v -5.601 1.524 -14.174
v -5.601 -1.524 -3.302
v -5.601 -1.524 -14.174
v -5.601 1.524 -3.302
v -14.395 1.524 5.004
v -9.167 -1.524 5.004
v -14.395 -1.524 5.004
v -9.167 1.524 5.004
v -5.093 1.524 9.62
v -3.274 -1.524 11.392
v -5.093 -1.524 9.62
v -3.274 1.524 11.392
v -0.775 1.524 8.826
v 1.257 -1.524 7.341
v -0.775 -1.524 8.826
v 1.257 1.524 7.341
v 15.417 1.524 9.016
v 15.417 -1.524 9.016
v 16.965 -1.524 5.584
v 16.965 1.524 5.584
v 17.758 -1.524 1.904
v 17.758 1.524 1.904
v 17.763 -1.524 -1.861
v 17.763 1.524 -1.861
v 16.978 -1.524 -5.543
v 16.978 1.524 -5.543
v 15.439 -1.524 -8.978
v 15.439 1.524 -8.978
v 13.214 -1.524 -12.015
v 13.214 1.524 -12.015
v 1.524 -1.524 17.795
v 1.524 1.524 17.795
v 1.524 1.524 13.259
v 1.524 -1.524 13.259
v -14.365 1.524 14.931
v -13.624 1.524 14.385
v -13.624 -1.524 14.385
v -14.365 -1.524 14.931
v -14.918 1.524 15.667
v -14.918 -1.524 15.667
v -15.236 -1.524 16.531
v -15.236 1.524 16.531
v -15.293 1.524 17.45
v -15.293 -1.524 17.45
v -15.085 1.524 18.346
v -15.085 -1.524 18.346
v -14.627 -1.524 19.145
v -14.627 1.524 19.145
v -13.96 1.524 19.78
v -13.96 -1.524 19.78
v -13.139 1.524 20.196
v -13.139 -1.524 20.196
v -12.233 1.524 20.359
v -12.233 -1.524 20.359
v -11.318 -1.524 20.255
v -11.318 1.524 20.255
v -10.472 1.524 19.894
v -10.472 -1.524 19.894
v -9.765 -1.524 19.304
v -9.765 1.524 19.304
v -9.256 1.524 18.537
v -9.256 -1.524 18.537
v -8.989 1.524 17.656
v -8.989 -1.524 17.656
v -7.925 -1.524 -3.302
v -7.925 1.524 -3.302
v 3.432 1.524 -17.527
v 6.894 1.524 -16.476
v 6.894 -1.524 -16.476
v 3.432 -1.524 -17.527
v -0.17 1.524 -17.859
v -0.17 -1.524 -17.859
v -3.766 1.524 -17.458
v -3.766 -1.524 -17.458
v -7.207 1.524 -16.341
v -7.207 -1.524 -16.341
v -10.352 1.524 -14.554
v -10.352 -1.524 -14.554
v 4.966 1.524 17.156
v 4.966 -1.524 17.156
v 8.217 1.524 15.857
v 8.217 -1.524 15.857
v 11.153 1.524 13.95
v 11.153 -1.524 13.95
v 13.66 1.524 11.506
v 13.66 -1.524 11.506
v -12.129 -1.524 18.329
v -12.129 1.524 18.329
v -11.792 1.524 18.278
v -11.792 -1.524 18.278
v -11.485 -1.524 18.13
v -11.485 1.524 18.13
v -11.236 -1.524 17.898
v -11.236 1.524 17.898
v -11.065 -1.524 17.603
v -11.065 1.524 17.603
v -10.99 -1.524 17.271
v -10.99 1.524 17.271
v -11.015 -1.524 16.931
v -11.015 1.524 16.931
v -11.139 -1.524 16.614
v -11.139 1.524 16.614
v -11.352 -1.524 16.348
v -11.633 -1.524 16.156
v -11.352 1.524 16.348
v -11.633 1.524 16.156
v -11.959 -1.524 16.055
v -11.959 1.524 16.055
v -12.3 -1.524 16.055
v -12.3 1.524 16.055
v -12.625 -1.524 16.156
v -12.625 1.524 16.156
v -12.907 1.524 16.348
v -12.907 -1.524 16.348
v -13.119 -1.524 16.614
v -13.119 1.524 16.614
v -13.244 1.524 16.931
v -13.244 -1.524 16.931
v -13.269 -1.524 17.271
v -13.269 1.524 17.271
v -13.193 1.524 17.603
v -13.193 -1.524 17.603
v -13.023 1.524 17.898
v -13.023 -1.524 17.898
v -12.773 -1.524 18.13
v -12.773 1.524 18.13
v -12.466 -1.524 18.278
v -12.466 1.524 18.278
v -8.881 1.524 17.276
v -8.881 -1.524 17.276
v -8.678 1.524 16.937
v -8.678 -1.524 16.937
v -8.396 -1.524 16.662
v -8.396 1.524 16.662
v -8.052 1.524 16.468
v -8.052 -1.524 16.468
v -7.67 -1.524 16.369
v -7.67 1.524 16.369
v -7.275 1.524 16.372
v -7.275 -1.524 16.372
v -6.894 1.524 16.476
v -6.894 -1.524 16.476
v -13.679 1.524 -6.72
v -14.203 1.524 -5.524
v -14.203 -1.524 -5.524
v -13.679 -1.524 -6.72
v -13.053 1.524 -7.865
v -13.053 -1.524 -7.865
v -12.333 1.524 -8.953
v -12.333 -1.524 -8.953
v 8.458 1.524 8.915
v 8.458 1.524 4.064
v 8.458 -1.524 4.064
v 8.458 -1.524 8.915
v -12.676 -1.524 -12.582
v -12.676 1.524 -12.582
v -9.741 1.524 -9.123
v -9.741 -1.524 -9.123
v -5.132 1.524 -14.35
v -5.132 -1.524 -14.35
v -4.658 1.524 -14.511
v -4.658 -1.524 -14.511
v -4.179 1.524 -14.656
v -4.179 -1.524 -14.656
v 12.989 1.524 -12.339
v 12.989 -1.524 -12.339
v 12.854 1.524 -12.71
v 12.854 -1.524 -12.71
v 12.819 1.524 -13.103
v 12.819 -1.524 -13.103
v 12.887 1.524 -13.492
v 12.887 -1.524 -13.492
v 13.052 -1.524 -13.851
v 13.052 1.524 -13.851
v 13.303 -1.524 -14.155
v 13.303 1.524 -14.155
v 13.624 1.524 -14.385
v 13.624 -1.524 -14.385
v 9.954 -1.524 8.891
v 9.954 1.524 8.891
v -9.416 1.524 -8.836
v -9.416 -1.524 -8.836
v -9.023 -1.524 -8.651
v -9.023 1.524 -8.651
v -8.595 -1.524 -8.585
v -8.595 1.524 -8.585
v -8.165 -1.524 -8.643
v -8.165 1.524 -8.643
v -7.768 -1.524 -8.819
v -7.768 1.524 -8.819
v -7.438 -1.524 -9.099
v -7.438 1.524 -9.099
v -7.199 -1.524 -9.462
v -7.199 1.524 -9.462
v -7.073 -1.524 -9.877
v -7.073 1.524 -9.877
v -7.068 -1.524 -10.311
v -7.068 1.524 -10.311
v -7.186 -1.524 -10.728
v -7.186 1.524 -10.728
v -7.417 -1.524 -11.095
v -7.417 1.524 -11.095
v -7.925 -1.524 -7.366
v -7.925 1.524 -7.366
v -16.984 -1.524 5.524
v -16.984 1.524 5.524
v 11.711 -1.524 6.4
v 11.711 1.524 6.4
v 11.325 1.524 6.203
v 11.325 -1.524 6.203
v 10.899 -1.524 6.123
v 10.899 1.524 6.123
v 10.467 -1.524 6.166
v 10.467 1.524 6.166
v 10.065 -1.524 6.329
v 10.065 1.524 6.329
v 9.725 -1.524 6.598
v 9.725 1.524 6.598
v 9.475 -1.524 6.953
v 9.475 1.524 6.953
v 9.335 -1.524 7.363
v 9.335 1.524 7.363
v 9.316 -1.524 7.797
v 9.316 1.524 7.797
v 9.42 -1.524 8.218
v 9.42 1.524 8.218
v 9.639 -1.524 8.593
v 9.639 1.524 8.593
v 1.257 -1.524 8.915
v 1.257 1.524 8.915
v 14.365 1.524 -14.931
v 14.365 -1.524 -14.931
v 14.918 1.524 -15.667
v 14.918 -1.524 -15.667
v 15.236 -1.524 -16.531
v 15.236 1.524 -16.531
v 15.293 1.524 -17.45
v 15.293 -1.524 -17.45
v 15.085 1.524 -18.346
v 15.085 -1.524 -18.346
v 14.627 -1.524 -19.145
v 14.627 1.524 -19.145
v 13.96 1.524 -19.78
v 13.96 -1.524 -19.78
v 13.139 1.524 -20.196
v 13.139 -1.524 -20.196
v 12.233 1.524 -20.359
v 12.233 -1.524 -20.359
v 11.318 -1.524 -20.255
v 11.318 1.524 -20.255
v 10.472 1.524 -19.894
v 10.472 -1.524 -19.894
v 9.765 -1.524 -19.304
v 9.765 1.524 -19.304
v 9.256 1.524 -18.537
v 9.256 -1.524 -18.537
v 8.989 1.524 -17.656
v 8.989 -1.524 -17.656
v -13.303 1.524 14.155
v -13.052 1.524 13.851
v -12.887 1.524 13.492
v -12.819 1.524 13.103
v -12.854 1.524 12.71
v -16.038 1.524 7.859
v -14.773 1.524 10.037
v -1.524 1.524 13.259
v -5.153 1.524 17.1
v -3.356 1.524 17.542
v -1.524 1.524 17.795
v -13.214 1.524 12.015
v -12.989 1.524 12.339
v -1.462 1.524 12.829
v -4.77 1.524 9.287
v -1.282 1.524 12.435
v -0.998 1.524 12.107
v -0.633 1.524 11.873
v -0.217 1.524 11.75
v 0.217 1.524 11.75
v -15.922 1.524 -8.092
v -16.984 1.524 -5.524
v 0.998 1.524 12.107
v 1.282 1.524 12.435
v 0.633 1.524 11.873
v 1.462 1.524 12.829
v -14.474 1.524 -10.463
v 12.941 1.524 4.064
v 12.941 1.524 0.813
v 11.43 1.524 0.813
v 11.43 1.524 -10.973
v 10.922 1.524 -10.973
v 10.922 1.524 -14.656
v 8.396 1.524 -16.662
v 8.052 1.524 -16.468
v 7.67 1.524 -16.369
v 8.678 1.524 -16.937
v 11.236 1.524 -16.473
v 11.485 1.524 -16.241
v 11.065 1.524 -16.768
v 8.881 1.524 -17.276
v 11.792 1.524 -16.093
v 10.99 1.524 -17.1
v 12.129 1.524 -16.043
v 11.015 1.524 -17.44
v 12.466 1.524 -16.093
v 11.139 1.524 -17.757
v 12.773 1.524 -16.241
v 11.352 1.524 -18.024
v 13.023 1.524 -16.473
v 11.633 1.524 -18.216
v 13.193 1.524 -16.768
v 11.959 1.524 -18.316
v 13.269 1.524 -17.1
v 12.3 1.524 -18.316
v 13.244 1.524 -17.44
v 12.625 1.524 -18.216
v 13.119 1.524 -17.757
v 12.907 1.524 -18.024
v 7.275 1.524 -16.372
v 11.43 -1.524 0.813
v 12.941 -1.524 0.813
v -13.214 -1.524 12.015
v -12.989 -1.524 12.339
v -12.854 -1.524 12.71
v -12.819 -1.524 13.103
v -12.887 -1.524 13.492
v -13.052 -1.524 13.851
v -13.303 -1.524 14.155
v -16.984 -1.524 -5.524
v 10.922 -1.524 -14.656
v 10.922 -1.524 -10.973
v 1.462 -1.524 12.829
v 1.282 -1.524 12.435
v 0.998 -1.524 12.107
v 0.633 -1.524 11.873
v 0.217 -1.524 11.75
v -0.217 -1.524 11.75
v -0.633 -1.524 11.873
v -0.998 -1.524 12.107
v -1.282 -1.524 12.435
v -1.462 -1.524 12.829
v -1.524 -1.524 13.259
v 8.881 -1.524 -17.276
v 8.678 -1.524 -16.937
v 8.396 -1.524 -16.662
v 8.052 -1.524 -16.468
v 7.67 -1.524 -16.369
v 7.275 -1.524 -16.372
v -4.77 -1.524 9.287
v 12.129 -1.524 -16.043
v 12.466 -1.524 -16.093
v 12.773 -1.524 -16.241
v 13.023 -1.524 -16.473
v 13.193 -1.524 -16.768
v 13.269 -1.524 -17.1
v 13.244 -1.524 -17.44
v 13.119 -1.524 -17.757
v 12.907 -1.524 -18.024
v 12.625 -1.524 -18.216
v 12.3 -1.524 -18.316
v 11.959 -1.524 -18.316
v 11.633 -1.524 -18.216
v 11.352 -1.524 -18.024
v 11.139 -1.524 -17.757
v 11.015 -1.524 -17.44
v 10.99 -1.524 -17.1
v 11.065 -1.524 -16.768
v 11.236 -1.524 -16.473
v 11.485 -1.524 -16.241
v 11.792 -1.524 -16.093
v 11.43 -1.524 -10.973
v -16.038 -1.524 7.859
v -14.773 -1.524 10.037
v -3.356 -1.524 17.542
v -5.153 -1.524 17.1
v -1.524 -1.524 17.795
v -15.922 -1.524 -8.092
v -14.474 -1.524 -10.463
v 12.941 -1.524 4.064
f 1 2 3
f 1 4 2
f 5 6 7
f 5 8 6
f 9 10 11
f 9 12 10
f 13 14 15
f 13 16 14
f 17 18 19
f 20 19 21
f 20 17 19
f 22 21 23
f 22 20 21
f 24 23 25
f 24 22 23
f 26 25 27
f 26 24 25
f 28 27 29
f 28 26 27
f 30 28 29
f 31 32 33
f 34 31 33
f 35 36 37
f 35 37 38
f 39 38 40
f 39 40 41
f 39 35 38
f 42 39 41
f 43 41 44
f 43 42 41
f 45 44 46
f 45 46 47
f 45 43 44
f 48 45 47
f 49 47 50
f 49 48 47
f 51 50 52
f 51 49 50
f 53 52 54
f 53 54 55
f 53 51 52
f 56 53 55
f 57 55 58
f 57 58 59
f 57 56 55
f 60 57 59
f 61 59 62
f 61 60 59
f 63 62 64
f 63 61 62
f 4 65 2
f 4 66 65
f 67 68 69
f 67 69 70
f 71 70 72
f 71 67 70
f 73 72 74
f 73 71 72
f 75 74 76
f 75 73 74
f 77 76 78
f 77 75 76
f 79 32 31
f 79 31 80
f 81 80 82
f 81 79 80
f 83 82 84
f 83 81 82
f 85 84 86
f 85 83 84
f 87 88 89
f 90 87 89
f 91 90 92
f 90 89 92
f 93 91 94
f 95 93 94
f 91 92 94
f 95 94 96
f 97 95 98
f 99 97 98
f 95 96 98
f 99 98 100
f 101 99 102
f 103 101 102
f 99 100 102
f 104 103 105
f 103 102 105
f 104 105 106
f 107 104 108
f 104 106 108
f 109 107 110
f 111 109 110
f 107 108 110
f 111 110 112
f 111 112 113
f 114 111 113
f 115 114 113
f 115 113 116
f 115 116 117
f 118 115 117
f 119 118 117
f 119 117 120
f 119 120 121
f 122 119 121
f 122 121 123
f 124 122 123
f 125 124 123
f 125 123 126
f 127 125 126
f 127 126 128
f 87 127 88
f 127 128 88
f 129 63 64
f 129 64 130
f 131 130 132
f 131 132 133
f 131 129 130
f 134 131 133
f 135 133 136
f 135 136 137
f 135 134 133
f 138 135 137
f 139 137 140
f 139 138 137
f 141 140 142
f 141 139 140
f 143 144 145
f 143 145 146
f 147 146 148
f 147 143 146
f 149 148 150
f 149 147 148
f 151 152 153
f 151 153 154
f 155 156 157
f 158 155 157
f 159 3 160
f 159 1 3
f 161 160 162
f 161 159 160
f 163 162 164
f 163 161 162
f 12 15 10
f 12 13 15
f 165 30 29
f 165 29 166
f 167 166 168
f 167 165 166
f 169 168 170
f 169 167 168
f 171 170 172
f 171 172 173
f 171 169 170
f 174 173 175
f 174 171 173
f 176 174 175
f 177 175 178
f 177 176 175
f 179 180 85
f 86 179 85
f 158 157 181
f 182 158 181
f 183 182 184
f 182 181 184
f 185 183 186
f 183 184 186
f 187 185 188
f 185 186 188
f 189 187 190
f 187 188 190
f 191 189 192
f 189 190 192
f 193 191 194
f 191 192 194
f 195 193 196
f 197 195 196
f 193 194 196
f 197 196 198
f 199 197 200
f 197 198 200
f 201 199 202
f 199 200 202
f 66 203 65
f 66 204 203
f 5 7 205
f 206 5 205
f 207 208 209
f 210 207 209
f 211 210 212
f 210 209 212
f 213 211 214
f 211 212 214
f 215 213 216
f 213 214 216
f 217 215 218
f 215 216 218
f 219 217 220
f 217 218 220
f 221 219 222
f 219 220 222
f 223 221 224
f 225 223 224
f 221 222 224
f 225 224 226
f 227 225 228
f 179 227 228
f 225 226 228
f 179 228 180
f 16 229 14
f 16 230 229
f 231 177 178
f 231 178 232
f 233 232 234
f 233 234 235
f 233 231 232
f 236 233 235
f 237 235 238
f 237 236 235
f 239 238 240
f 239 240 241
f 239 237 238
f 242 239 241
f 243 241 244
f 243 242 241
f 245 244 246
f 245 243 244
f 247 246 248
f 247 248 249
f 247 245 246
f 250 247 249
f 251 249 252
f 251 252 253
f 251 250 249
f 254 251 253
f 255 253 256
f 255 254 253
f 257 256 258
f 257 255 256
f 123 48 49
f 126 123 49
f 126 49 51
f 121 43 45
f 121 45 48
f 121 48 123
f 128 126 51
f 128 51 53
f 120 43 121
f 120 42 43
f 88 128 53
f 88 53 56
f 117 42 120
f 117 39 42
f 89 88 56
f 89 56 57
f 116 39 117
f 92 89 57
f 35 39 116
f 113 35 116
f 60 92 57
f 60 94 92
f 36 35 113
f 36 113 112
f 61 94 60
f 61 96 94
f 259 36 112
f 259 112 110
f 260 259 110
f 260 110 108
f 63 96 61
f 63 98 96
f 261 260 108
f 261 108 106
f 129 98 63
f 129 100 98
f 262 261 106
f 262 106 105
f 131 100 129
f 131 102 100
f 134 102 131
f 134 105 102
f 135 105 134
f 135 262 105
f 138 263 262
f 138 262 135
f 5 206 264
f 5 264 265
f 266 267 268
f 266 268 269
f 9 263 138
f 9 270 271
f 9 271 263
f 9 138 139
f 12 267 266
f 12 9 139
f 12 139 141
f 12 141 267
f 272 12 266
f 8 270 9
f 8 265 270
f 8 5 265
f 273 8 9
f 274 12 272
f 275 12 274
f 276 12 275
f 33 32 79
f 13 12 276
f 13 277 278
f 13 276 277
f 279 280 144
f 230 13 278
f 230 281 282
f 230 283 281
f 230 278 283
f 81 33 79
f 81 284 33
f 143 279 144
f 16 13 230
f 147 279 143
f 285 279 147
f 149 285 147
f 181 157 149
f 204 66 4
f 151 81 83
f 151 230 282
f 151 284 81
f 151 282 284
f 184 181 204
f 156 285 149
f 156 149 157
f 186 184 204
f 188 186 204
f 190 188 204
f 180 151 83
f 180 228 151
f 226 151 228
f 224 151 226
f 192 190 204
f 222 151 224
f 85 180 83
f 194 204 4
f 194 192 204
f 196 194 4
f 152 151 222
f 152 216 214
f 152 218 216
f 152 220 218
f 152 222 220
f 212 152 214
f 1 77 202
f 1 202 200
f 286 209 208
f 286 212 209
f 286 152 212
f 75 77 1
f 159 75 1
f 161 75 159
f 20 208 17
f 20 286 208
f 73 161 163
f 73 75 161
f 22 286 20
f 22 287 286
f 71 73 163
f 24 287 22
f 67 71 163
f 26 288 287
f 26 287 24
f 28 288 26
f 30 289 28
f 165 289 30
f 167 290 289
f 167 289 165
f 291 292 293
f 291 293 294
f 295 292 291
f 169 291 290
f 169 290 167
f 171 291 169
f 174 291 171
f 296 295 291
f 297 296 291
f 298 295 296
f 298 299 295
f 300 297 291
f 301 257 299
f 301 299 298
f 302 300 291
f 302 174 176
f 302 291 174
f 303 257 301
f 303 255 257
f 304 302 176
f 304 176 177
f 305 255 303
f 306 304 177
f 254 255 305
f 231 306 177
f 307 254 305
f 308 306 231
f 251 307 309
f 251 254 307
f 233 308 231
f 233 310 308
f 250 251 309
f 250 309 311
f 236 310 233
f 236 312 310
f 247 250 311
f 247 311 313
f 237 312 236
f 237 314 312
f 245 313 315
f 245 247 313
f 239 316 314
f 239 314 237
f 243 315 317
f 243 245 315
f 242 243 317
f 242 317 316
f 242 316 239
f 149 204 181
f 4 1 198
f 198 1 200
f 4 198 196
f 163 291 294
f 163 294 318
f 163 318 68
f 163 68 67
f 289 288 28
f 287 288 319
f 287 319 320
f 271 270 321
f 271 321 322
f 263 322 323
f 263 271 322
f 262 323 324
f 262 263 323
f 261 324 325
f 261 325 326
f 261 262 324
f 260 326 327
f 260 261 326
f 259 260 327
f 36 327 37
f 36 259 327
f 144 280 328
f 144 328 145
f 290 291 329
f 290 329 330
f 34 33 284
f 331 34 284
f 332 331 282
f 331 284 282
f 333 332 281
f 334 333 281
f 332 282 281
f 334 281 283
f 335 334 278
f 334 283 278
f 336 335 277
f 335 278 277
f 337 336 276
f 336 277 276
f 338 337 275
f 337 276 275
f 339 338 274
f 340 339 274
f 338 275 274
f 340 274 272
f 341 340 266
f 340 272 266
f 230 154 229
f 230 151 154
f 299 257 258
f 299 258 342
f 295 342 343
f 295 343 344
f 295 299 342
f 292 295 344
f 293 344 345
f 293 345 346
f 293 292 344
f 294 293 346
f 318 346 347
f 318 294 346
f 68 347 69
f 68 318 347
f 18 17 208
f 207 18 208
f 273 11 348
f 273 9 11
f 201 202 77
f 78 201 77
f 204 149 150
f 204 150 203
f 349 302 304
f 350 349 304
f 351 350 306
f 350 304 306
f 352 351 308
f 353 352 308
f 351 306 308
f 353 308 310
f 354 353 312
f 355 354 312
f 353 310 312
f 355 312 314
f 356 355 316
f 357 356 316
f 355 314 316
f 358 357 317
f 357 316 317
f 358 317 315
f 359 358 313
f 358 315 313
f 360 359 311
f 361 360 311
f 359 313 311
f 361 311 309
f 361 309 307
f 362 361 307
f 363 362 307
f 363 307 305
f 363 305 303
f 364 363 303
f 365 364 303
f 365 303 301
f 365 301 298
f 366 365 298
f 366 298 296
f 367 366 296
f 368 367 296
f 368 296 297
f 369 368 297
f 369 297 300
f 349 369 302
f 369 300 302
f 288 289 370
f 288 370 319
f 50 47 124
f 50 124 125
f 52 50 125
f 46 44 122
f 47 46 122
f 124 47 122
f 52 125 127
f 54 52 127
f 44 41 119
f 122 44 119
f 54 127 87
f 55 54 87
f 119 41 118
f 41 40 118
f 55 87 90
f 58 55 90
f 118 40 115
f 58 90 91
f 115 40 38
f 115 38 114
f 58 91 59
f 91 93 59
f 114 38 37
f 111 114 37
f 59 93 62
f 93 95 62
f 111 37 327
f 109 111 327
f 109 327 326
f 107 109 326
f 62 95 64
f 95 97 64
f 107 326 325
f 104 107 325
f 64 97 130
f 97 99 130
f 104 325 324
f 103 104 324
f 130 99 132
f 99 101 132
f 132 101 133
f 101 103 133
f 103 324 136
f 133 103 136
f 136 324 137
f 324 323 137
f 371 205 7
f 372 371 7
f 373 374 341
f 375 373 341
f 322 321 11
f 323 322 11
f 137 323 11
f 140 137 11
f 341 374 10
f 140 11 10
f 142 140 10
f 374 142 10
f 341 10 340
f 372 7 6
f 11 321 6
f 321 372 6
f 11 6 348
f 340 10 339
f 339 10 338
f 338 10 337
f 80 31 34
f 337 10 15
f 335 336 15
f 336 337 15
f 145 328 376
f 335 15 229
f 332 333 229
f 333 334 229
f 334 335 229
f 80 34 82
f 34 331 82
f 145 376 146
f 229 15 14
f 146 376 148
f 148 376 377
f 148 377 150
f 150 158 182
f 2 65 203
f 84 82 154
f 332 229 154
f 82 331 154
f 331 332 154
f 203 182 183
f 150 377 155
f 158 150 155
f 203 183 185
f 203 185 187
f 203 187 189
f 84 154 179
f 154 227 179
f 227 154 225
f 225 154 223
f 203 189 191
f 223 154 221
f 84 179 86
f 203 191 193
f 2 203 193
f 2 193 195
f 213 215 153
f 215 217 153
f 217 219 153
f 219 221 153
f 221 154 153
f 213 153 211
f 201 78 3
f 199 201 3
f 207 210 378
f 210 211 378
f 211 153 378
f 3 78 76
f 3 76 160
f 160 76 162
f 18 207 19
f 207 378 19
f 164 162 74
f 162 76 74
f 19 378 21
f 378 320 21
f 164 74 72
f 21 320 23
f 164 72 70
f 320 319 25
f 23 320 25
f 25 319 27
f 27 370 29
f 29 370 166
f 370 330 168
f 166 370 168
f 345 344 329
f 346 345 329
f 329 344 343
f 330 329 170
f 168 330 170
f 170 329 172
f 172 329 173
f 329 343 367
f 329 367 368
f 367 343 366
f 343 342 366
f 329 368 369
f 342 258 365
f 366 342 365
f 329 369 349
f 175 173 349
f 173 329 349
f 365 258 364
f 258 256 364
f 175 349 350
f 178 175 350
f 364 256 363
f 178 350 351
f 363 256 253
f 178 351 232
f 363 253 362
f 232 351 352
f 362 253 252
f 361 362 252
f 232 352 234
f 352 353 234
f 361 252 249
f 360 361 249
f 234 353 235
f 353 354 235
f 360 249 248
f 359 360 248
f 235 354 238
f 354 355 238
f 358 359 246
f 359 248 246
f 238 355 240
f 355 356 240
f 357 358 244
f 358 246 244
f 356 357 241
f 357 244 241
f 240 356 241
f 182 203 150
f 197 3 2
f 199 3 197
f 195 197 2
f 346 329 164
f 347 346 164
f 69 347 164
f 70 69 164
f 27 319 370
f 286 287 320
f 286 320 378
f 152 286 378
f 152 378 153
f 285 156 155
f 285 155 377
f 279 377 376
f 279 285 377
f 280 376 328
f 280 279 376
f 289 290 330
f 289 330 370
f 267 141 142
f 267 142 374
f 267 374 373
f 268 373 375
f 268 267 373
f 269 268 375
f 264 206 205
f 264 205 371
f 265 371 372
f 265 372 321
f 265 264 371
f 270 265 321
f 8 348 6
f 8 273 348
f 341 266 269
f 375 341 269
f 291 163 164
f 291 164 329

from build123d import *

# Parameters (mm, degrees)
SKETCH1_R             = 1.143
BOSS_EXTRUDE1_DEPTH   = 1.524
BOSS_EXTRUDE1_2_DEPTH = 1.524
SKETCH2_R             = 1.143
CUT_EXTRUDE2_DEPTH    = 26.441049651
SKETCH3_R             = 1.143
BOSS_EXTRUDE2_DEPTH   = 3.048


with BuildPart() as part:
    # Sketch1 → Boss-Extrude1 (new, symmetric)
    with BuildSketch(Plane(origin=(0, 0, 0), x_dir=(1, 0, 0), z_dir=(0, 1, 0))):
        with BuildLine():
            Line((-14.395123673, -5.0038), (-16.984058744, -5.5245))
            ThreePointArc((-16.984058744, -5.5245), (10.284594762, -14.601556843), (10.922, 14.131109924))
            Line((10.922, 14.131109924), (10.922, 10.9728))
            Line((10.922, 10.9728), (11.43, 10.9728))
            Line((11.43, 10.9728), (11.43, -0.8128))
            Line((11.43, -0.8128), (12.9413, -0.8128))
            Line((12.9413, -0.8128), (12.9413, -4.064))
            Line((12.9413, -4.064), (8.4582, -4.064))
            Line((8.4582, -4.064), (8.4582, -8.9154))
            Line((8.4582, -8.9154), (1.2573, -8.9154))
            Line((1.2573, -8.9154), (1.2573, -7.3406))
            Line((1.2573, -7.3406), (-0.7747, -8.8265))
            Line((-0.7747, -8.8265), (-3.273729572, -11.3919))
            Line((-3.273729572, -11.3919), (-5.093162196, -9.619538602))
            Line((-5.093162196, -9.619538602), (-4.769706241, -9.287492148))
            Line((-4.769706241, -9.287492148), (-9.167166743, -5.0038))
            Line((-9.167166743, -5.0038), (-14.395123673, -5.0038))
        make_face()
        with Locations(Location((0, -13.2588, 0), (0, 0, 90))):
            Circle(SKETCH1_R, mode=Mode.SUBTRACT)
        with Locations(Location((10.832526773, -7.6454, 0), (0, 0, 90))):
            Circle(SKETCH1_R, mode=Mode.SUBTRACT)
    extrude(amount=BOSS_EXTRUDE1_DEPTH, both=True)


with BuildPart() as body_2:
    # Sketch1 → Boss-Extrude1 2 (new, symmetric)
    with BuildSketch(Plane(origin=(0, 0, 0), x_dir=(1, 0, 0), z_dir=(0, 1, 0))):
        with BuildLine():
            Line((-4.179129857, 14.6558), (10.207148379, 14.6558))
            ThreePointArc((10.207148379, 14.6558), (-5.685665172, 16.930787437), (-16.984058744, 5.5245))
            Line((-16.984058744, 5.5245), (-14.203432675, 5.5245))
            ThreePointArc((-14.203432675, 5.5245), (-13.378320264, 7.299188099), (-12.332576282, 8.9535))
            Line((-12.332576282, 8.9535), (-7.9248, 7.366))
            Line((-7.9248, 7.366), (-7.9248, 3.302))
            Line((-7.9248, 3.302), (-5.6007, 3.302))
            Line((-5.6007, 3.302), (-5.6007, 14.173558463))
            ThreePointArc((-5.6007, 14.173558463), (-4.895856129, 14.43219293), (-4.179129857, 14.6558))
        make_face()
        with Locations(Location((-8.579035657, 10.1092, 0), (0, 0, 90))):
            Circle(SKETCH1_R, mode=Mode.SUBTRACT)
    extrude(amount=BOSS_EXTRUDE1_2_DEPTH, both=True)


with BuildPart() as cut_extrude2_tool:
    # Sketch2 → Cut-Extrude2 (new, through all)
    # profile 1 of 3: a face of its own
    with BuildSketch(Plane(origin=(0, 1.524, 0), x_dir=(1, 0, 0), z_dir=(0, 1, 0))):
        with BuildLine():
            Line((-12.676023011, 12.581605315), (-9.741012668, 9.123103947))
            ThreePointArc((-9.741012668, 9.123103947), (-7.592939604, 8.947222989), (-7.417058645, 11.095296053))
            Line((-7.417058645, 11.095296053), (-10.352068988, 14.55379742))
            ThreePointArc((-10.352068988, 14.55379742), (-11.556194906, 13.61736799), (-12.676023011, 12.581605315))
        make_face()
        with Locations((-8.579035657, 10.1092)):
            Circle(SKETCH2_R, mode=Mode.SUBTRACT)
    # profile 2 of 3: a face of its own
    with BuildSketch(Plane(origin=(0, 1.524, 0), x_dir=(1, 0, 0), z_dir=(0, 1, 0))):
        with BuildLine():
            Line((1.524, -17.794824407), (1.524, -13.2588))
            ThreePointArc((1.524, -13.2588), (0, -11.7348), (-1.524, -13.2588))
            Line((-1.524, -13.2588), (-1.524, -17.794824407))
            ThreePointArc((-1.524, -17.794824407), (0, -17.859965052), (1.524, -17.794824407))
        make_face()
        with Locations((0, -13.2588)):
            Circle(SKETCH2_R, mode=Mode.SUBTRACT)
    # profile 3 of 3: a face of its own
    with BuildSketch(Plane(origin=(0, 1.524, 0), x_dir=(1, 0, 0), z_dir=(0, 1, 0))):
        with BuildLine():
            Line((9.953745163, -8.89051802), (13.659706927, -11.506118301))
            ThreePointArc((13.659706927, -11.506118301), (14.591708872, -10.298562224), (15.417270145, -9.015882261))
            Line((15.417270145, -9.015882261), (11.711308382, -6.40028198))
            ThreePointArc((11.711308382, -6.40028198), (9.587408753, -6.766618391), (9.953745163, -8.89051802))
        make_face()
        with Locations((10.832526773, -7.6454)):
            Circle(SKETCH2_R, mode=Mode.SUBTRACT)
    extrude(amount=-CUT_EXTRUDE2_DEPTH)


with BuildPart() as part_1:
    add(part.part)

    # Cut-Extrude2: cut by cut_extrude2_tool
    add(cut_extrude2_tool.part, mode=Mode.SUBTRACT)



with BuildPart() as body_2_1:
    add(body_2.part)

    # Cut-Extrude2: cut by cut_extrude2_tool
    add(cut_extrude2_tool.part, mode=Mode.SUBTRACT)


with BuildPart() as part_2:
    add(part_1.part)

    add(body_2_1.part)  # Boss-Extrude2 merges body 2
    # Sketch3 → Boss-Extrude2 (add)
    # profile 1 of 2: a face of its own
    with BuildSketch(Plane(origin=(0, 1.524, 0), x_dir=(1, 0, 0), z_dir=(0, 1, 0))):
        with BuildLine():
            ThreePointArc((6.893924032, 16.475805386), (8.598824007, 15.653708103), (10.207148379, 14.6558))
            Line((10.207148379, 14.6558), (10.922, 14.6558))
            Line((10.922, 14.6558), (10.922, 14.131109924))
            ThreePointArc((10.922, 14.131109924), (12.114466388, 13.123187715), (13.214344503, 12.014967792))
            ThreePointArc((13.214344503, 12.014967792), (12.840241174, 13.300024042), (13.624339722, 14.384695574))
            ThreePointArc((13.624339722, 14.384695574), (13.960152262, 19.779700621), (8.989376751, 17.655967979))
            ThreePointArc((8.989376751, 17.655967979), (8.230051983, 16.553811563), (6.893924032, 16.475805386))
        make_face()
        with Locations(Location((12.129357243, 17.185704746, 0), (0, 0, 270))):
            Circle(SKETCH3_R, mode=Mode.SUBTRACT)
    # profile 2 of 2: a face of its own
    with BuildSketch(Plane(origin=(0, 1.524, 0), x_dir=(1, 0, 0), z_dir=(0, 1, 0))):
        with BuildLine():
            ThreePointArc((-13.214344503, -12.014967792), (-12.840241174, -13.300024042), (-13.624339722, -14.384695574))
            ThreePointArc((-13.624339722, -14.384695574), (-13.960152262, -19.779700621), (-8.989376751, -17.655967979))
            ThreePointArc((-8.989376751, -17.655967979), (-8.230051983, -16.553811563), (-6.893924032, -16.475805386))
            ThreePointArc((-6.893924032, -16.475805386), (-10.298562224, -14.591708872), (-13.214344503, -12.014967792))
        make_face()
        with Locations(Location((-12.129357243, -17.185704746, 0), (0, 0, 270))):
            Circle(SKETCH3_R, mode=Mode.SUBTRACT)
    extrude(amount=-BOSS_EXTRUDE2_DEPTH)


solid = part_2.part
